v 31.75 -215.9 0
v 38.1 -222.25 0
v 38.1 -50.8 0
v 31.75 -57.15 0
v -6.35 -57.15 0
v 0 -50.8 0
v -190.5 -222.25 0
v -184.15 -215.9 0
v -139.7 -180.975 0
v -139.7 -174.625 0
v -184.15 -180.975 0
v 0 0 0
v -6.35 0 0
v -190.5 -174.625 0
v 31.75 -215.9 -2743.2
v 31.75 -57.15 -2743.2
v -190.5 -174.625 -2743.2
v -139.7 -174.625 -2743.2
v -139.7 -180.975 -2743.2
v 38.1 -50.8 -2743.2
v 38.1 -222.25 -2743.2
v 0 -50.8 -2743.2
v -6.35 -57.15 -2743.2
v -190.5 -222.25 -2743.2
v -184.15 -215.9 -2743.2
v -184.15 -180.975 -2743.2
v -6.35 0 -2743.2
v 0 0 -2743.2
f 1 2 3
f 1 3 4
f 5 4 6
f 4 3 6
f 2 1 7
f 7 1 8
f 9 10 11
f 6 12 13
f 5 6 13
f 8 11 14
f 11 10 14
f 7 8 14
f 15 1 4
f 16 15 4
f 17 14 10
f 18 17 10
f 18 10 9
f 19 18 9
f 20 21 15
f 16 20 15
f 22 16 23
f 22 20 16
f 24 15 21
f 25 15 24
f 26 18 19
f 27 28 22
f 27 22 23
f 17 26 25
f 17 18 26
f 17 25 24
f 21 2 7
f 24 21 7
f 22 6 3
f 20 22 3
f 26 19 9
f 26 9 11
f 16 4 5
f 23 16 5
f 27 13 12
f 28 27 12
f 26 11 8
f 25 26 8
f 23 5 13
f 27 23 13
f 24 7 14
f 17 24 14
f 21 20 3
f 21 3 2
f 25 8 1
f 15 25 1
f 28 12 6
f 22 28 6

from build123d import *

# Parameters (mm, degrees)
SALIENTE_EXTRUIR1_DEPTH = 2743.2


with BuildPart() as part:
    # Croquis1 → Saliente-Extruir1 (new body)
    with BuildSketch(Plane.XY):
        Polygon((-139.7, -174.625), (-139.7, -180.975), (-184.15, -180.975), (-184.15, -215.9), (31.75, -215.9), (31.75, -57.15), (-6.35, -57.15), (-6.35, 0), (0, 0), (0, -50.8), (38.1, -50.8), (38.1, -222.25), (-190.5, -222.25), (-190.5, -174.625), align=None)
    extrude(amount=-SALIENTE_EXTRUIR1_DEPTH)


solid = part.part
